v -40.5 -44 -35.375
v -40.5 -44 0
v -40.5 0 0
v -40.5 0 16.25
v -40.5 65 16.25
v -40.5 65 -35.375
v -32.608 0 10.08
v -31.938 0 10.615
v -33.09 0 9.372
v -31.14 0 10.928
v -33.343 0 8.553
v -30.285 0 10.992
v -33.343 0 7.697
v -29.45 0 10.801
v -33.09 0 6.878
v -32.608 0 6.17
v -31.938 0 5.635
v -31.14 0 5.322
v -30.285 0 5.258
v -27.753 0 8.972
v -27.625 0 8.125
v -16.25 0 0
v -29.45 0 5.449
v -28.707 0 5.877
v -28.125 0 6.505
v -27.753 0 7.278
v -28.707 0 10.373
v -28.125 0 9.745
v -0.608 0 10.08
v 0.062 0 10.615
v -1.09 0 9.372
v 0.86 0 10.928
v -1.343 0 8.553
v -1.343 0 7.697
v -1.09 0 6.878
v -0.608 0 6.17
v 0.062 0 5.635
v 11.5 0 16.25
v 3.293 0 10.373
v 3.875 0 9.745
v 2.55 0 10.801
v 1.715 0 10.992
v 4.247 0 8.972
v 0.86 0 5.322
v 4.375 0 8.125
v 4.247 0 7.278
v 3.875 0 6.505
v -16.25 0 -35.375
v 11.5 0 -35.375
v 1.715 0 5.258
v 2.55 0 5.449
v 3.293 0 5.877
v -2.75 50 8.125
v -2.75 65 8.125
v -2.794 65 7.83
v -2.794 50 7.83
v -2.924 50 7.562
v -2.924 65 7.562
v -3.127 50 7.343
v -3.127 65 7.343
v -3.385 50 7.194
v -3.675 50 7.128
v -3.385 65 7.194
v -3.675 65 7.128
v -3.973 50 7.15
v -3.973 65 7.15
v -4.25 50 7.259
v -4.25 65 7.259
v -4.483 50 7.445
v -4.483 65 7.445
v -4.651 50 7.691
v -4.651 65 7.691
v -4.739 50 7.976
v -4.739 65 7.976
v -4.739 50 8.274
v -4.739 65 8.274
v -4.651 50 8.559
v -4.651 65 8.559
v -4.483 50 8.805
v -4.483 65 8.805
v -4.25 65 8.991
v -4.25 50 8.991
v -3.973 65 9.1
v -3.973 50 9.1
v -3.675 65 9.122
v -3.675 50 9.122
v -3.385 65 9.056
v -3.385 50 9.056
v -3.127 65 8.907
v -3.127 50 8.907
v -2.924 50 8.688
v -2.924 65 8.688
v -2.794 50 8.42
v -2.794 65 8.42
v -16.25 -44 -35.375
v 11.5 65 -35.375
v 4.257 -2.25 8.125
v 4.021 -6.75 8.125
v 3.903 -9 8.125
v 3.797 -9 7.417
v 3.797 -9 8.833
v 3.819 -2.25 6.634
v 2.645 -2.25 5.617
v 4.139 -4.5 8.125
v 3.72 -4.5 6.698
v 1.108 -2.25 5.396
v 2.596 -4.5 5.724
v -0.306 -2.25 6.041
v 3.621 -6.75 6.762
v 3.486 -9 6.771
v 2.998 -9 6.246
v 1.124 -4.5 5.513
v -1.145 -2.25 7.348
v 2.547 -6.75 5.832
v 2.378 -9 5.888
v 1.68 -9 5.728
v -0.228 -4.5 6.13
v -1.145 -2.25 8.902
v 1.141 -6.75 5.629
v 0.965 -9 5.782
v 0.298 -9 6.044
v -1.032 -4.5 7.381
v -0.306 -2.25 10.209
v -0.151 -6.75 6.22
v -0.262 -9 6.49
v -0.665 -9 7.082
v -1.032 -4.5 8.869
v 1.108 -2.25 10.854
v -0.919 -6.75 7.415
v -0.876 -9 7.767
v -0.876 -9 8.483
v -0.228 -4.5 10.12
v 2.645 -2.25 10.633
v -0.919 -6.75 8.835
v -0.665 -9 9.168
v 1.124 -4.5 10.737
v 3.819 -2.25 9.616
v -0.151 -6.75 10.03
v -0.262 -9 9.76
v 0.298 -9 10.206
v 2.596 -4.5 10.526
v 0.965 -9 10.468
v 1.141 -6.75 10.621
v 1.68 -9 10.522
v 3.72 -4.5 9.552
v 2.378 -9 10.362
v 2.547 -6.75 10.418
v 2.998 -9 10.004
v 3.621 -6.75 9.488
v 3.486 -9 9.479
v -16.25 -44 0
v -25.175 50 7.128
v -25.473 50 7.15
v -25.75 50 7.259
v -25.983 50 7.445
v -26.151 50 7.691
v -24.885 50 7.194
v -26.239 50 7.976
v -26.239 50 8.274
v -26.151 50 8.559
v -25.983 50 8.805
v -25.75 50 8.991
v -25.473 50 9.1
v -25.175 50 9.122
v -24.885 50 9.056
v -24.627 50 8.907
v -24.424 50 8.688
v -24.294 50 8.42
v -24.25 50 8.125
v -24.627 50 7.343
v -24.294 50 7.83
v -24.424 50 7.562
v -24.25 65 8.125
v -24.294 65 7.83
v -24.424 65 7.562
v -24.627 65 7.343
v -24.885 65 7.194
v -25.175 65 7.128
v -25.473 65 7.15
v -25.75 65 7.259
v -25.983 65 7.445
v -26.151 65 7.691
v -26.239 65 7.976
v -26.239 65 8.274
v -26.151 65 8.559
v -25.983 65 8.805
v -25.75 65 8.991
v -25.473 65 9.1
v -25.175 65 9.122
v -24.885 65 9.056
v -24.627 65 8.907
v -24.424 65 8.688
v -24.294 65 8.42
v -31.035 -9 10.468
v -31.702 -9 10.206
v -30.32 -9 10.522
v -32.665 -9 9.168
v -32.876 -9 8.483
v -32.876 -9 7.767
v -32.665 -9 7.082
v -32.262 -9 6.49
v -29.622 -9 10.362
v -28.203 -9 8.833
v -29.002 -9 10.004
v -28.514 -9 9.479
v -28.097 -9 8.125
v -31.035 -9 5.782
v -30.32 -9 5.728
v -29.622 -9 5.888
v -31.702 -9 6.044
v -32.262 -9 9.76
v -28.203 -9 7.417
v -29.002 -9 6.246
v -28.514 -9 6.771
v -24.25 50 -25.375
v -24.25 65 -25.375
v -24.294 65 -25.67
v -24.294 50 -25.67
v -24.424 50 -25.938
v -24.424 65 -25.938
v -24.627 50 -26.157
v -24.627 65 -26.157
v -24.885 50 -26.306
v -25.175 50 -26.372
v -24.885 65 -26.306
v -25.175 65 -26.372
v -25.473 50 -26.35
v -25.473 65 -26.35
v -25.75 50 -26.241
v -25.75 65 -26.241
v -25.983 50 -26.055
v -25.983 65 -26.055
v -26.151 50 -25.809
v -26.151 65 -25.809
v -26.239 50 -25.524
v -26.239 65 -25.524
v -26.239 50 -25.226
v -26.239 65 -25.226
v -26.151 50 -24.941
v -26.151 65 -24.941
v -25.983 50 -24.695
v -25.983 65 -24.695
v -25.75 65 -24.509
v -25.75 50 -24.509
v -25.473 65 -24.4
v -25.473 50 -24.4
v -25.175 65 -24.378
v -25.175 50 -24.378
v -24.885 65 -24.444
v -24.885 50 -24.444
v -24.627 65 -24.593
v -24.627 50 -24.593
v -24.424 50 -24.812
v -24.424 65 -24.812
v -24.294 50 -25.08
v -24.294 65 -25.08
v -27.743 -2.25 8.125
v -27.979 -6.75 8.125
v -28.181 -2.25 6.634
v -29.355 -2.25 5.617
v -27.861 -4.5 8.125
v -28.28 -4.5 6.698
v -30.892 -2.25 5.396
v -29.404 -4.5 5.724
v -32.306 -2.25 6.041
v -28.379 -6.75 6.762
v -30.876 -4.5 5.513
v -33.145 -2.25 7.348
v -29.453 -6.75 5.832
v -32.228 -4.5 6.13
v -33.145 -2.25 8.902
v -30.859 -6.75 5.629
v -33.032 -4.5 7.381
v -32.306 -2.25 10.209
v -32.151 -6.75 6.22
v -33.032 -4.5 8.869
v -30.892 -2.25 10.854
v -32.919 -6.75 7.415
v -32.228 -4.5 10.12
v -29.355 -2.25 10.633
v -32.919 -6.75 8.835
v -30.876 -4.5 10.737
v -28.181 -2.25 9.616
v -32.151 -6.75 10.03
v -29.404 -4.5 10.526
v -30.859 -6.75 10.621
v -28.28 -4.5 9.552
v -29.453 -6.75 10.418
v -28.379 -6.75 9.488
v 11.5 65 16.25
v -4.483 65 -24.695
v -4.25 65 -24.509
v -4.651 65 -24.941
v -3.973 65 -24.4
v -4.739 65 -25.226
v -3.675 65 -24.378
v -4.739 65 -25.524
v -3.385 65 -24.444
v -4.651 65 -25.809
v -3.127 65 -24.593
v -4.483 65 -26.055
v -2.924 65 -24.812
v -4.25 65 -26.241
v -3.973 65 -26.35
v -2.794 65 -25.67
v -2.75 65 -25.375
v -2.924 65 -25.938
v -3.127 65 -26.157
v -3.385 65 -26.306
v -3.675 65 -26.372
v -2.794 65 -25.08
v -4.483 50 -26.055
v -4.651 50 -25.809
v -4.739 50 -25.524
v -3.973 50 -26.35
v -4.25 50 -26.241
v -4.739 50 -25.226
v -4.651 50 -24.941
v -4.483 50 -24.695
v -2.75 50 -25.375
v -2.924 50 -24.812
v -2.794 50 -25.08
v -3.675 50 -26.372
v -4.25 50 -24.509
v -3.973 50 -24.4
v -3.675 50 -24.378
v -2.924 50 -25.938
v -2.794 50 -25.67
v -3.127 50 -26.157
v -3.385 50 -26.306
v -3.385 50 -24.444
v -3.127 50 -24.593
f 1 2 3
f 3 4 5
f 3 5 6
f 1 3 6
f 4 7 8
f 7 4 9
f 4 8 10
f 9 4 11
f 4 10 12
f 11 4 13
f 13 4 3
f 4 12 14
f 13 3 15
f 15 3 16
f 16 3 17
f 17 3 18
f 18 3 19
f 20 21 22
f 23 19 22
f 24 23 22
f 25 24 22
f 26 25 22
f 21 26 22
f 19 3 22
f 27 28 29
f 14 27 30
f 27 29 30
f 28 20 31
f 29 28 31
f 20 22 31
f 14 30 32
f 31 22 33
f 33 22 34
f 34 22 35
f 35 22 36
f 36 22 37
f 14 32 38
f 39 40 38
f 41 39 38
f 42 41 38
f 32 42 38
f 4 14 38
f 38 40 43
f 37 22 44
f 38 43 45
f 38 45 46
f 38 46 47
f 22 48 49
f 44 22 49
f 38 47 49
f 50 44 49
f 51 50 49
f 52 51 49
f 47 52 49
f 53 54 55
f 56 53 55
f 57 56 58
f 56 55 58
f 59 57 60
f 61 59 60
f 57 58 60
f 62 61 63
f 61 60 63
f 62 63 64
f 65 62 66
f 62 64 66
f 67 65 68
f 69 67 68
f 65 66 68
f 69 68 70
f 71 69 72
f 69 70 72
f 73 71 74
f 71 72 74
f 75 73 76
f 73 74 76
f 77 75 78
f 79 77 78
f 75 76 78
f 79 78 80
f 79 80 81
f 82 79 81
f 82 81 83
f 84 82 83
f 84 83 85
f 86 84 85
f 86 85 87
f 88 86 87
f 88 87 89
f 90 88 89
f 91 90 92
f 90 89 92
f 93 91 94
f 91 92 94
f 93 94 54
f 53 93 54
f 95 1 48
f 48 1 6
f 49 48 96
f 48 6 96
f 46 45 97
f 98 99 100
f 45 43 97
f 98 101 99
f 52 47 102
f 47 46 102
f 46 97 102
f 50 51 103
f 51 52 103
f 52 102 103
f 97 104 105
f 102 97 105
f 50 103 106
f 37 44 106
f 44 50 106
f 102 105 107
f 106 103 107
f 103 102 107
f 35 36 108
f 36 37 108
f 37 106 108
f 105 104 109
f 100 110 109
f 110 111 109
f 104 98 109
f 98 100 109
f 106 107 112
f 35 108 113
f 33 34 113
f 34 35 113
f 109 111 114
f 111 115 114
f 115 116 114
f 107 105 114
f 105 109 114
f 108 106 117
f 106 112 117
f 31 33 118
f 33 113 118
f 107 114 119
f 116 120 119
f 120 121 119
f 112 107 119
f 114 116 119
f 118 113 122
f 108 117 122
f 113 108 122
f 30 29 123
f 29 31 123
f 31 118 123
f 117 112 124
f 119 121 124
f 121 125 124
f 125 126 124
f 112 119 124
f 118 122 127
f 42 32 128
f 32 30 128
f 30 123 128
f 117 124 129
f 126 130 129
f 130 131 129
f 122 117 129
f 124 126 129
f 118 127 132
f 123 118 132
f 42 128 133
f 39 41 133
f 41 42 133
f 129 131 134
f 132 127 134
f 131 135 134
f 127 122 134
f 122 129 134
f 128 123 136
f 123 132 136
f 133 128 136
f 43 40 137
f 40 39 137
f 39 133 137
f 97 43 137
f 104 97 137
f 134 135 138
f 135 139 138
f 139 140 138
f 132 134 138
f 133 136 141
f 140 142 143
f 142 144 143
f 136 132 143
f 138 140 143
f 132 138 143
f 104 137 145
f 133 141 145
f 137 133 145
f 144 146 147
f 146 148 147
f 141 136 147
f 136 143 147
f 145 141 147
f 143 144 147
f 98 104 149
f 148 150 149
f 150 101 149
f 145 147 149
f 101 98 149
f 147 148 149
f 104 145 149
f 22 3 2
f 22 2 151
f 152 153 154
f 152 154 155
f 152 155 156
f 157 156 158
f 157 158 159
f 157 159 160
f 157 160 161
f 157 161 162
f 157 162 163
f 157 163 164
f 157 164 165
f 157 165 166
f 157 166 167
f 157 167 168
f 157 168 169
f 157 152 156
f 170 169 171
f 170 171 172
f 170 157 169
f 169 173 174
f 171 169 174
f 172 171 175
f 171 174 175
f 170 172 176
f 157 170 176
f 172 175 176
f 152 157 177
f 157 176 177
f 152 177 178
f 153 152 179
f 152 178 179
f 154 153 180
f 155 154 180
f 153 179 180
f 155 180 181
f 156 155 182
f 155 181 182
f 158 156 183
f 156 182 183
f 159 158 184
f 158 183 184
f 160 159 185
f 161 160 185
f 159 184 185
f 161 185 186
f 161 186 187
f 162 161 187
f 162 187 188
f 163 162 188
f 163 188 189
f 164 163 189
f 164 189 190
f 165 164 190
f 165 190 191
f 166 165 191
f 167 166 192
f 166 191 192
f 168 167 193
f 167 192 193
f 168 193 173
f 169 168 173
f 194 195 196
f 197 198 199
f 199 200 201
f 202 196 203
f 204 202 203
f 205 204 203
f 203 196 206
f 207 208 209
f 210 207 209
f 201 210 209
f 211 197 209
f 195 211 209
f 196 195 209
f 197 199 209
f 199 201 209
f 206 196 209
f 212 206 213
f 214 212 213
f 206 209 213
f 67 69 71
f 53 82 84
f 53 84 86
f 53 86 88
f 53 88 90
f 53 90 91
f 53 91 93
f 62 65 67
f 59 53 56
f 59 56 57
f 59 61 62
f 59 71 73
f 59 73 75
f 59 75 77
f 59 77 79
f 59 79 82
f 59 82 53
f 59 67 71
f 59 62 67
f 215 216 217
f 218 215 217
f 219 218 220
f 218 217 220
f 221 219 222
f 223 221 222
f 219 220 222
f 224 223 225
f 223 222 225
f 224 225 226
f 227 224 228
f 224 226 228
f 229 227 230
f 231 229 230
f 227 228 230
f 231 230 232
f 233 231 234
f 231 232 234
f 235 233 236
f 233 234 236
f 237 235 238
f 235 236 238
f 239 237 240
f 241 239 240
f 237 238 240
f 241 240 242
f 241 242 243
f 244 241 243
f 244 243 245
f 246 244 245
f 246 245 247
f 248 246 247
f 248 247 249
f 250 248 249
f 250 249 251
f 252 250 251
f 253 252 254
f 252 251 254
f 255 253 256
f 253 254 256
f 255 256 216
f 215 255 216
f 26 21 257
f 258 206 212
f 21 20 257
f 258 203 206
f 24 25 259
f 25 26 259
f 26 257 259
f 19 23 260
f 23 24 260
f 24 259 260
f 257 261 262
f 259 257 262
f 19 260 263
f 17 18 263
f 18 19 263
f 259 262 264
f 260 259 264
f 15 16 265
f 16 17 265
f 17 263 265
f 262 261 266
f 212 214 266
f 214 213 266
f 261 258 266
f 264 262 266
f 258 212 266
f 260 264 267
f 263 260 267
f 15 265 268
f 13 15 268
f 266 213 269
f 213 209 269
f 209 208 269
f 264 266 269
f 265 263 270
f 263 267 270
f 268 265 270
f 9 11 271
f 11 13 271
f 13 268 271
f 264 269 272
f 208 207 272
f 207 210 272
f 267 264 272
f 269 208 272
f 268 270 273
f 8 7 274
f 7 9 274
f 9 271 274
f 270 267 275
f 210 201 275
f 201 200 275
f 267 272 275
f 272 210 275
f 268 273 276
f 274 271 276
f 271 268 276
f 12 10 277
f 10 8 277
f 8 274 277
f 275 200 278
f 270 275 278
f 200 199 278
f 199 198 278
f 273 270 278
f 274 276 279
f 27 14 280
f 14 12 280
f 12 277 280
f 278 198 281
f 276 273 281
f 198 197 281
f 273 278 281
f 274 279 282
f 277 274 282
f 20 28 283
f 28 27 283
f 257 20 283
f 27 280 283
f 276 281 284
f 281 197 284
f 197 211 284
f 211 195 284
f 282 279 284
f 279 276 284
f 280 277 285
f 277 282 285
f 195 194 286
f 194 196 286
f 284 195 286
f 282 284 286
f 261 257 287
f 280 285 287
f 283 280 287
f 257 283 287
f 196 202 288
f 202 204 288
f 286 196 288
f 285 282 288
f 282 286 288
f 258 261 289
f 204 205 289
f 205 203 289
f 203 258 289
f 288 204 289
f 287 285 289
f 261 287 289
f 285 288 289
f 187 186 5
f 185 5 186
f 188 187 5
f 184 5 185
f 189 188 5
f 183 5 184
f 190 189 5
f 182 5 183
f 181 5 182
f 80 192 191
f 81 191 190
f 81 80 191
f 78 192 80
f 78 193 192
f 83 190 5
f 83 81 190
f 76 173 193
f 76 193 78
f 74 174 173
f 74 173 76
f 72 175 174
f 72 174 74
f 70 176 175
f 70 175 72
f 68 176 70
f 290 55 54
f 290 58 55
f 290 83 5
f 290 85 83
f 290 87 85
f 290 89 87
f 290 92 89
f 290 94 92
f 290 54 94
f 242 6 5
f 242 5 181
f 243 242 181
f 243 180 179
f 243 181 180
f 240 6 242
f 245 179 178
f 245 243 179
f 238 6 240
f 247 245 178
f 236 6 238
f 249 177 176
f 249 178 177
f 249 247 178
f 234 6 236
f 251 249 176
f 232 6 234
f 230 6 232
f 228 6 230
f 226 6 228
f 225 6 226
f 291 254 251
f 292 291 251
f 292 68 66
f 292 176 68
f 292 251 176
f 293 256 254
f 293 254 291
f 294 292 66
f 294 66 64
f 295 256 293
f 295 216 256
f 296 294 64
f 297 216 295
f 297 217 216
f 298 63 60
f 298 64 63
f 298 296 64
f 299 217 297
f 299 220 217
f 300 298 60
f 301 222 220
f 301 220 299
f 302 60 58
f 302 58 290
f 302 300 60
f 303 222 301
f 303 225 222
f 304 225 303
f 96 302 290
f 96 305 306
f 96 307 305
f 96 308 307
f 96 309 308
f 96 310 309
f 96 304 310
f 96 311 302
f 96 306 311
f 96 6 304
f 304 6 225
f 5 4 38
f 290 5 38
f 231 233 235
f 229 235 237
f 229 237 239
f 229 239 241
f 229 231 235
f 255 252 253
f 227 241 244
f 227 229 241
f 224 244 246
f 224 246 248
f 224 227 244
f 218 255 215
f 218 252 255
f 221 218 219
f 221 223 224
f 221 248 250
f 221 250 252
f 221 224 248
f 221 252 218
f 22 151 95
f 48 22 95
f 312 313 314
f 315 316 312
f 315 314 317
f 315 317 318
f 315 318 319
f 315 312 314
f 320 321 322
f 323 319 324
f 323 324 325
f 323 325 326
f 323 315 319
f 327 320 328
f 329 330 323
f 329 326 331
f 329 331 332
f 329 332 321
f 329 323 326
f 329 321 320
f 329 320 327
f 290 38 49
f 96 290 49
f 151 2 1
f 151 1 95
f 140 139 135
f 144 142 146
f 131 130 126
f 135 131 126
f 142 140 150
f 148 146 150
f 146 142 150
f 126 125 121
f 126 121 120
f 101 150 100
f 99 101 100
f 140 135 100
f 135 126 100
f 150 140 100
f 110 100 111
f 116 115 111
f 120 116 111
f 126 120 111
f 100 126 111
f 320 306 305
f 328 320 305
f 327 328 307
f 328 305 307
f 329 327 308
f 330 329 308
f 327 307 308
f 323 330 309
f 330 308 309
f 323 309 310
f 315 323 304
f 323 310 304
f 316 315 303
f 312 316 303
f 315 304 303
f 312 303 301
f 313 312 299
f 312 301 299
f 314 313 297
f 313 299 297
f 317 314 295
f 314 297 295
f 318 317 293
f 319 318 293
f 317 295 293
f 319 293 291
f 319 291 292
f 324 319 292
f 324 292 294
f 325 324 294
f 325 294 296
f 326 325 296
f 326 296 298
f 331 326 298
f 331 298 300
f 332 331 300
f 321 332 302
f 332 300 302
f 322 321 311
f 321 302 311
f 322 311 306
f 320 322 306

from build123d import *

# Parameters (mm, degrees)
SKETCH1_W           = 24.25
SKETCH1_H           = 35.375
SKETCH1_R           = 1
SKETCH1_W_2         = 16.25
SKETCH1_W_3         = 11.5
SKETCH1_R_2         = 2.875
BOSS_EXTRUDE1_DEPTH = 65
CUT_EXTRUDE1_START  = 65
SKETCH1_3_R         = 1
CUT_EXTRUDE1_DEPTH  = 15
SKETCH1_4_W         = 24.25
SKETCH1_4_H         = 35.375
SKETCH1_4_R         = 1
BOSS_EXTRUDE2_DEPTH = 44
SKETCH1_5_R         = 2.875
BOSS_EXTRUDE3_DEPTH = 9
BOSS_EXTRUDE3_TAPER = 3


with BuildPart() as part:
    # Sketch1 → Boss-Extrude1 (new body)
    with BuildSketch(Plane(origin=(0, 0, 0), x_dir=(1, 0, 0), z_dir=(0, 1, 0))):
        with Locations((-28.375, 17.6875)):
            Rectangle(SKETCH1_W, SKETCH1_H)
        with Locations((-25.25, 25.375)):
            Circle(SKETCH1_R, mode=Mode.SUBTRACT)
        with Locations((-8.125, 17.6875)):
            Rectangle(SKETCH1_W_2, SKETCH1_H)
        with Locations((-3.75, 25.375)):
            Circle(SKETCH1_R, mode=Mode.SUBTRACT)
        with Locations((5.75, 17.6875)):
            Rectangle(SKETCH1_W_3, SKETCH1_H)
        Polygon((11.5, 0), (0, 0), (-16.25, 0), (-40.5, 0), (-40.5, -16.25), (11.5, -16.25), align=None)
        with Locations((-30.5, -8.125)):
            Circle(SKETCH1_R_2, mode=Mode.SUBTRACT)
        with Locations((-25.25, -8.125)):
            Circle(SKETCH1_R, mode=Mode.SUBTRACT)
        with Locations((-3.75, -8.125)):
            Circle(SKETCH1_R, mode=Mode.SUBTRACT)
        with Locations((1.5, -8.125)):
            Circle(SKETCH1_R_2, mode=Mode.SUBTRACT)
        with Locations((-30.5, -8.125)):
            Circle(SKETCH1_R_2)
        with Locations((1.5, -8.125)):
            Circle(SKETCH1_R_2)
        with Locations((-3.75, -8.125)):
            Circle(SKETCH1_R)
        with Locations((-3.75, 25.375)):
            Circle(SKETCH1_R)
        with Locations((-25.25, 25.375)):
            Circle(SKETCH1_R)
        with Locations((-25.25, -8.125)):
            Circle(SKETCH1_R)
    extrude(amount=BOSS_EXTRUDE1_DEPTH)

    # Sketch1<3> → Cut-Extrude1 (cut)
    with BuildSketch(Plane(origin=(0, 0, 0), x_dir=(1, 0, 0), z_dir=(0, 1, 0)).offset(CUT_EXTRUDE1_START)):
        with Locations((-3.75, -8.125)):
            Circle(SKETCH1_3_R)
        with Locations((-25.25, -8.125)):
            Circle(SKETCH1_3_R)
        with Locations((-3.75, 25.375)):
            Circle(SKETCH1_3_R)
        with Locations((-25.25, 25.375)):
            Circle(SKETCH1_3_R)
    extrude(amount=-CUT_EXTRUDE1_DEPTH, mode=Mode.SUBTRACT)

    # Sketch1<4> → Boss-Extrude2 (add)
    with BuildSketch(Plane(origin=(0, 0, 0), x_dir=(1, 0, 0), z_dir=(0, 1, 0))):
        with Locations((-28.375, 17.6875)):
            Rectangle(SKETCH1_4_W, SKETCH1_4_H)
        with Locations((-25.25, 25.375)):
            Circle(SKETCH1_4_R, mode=Mode.SUBTRACT)
        with Locations((-25.25, 25.375)):
            Circle(SKETCH1_4_R)
    extrude(amount=-BOSS_EXTRUDE2_DEPTH)

    # Sketch1<5> → Boss-Extrude3 (add)
    with BuildSketch(Plane(origin=(0, 0, 0), x_dir=(1, 0, 0), z_dir=(0, 1, 0))):
        with Locations((1.5, -8.125)):
            Circle(SKETCH1_5_R)
        with Locations((-30.5, -8.125)):
            Circle(SKETCH1_5_R)
    extrude(amount=-BOSS_EXTRUDE3_DEPTH, taper=BOSS_EXTRUDE3_TAPER)


solid = part.part
